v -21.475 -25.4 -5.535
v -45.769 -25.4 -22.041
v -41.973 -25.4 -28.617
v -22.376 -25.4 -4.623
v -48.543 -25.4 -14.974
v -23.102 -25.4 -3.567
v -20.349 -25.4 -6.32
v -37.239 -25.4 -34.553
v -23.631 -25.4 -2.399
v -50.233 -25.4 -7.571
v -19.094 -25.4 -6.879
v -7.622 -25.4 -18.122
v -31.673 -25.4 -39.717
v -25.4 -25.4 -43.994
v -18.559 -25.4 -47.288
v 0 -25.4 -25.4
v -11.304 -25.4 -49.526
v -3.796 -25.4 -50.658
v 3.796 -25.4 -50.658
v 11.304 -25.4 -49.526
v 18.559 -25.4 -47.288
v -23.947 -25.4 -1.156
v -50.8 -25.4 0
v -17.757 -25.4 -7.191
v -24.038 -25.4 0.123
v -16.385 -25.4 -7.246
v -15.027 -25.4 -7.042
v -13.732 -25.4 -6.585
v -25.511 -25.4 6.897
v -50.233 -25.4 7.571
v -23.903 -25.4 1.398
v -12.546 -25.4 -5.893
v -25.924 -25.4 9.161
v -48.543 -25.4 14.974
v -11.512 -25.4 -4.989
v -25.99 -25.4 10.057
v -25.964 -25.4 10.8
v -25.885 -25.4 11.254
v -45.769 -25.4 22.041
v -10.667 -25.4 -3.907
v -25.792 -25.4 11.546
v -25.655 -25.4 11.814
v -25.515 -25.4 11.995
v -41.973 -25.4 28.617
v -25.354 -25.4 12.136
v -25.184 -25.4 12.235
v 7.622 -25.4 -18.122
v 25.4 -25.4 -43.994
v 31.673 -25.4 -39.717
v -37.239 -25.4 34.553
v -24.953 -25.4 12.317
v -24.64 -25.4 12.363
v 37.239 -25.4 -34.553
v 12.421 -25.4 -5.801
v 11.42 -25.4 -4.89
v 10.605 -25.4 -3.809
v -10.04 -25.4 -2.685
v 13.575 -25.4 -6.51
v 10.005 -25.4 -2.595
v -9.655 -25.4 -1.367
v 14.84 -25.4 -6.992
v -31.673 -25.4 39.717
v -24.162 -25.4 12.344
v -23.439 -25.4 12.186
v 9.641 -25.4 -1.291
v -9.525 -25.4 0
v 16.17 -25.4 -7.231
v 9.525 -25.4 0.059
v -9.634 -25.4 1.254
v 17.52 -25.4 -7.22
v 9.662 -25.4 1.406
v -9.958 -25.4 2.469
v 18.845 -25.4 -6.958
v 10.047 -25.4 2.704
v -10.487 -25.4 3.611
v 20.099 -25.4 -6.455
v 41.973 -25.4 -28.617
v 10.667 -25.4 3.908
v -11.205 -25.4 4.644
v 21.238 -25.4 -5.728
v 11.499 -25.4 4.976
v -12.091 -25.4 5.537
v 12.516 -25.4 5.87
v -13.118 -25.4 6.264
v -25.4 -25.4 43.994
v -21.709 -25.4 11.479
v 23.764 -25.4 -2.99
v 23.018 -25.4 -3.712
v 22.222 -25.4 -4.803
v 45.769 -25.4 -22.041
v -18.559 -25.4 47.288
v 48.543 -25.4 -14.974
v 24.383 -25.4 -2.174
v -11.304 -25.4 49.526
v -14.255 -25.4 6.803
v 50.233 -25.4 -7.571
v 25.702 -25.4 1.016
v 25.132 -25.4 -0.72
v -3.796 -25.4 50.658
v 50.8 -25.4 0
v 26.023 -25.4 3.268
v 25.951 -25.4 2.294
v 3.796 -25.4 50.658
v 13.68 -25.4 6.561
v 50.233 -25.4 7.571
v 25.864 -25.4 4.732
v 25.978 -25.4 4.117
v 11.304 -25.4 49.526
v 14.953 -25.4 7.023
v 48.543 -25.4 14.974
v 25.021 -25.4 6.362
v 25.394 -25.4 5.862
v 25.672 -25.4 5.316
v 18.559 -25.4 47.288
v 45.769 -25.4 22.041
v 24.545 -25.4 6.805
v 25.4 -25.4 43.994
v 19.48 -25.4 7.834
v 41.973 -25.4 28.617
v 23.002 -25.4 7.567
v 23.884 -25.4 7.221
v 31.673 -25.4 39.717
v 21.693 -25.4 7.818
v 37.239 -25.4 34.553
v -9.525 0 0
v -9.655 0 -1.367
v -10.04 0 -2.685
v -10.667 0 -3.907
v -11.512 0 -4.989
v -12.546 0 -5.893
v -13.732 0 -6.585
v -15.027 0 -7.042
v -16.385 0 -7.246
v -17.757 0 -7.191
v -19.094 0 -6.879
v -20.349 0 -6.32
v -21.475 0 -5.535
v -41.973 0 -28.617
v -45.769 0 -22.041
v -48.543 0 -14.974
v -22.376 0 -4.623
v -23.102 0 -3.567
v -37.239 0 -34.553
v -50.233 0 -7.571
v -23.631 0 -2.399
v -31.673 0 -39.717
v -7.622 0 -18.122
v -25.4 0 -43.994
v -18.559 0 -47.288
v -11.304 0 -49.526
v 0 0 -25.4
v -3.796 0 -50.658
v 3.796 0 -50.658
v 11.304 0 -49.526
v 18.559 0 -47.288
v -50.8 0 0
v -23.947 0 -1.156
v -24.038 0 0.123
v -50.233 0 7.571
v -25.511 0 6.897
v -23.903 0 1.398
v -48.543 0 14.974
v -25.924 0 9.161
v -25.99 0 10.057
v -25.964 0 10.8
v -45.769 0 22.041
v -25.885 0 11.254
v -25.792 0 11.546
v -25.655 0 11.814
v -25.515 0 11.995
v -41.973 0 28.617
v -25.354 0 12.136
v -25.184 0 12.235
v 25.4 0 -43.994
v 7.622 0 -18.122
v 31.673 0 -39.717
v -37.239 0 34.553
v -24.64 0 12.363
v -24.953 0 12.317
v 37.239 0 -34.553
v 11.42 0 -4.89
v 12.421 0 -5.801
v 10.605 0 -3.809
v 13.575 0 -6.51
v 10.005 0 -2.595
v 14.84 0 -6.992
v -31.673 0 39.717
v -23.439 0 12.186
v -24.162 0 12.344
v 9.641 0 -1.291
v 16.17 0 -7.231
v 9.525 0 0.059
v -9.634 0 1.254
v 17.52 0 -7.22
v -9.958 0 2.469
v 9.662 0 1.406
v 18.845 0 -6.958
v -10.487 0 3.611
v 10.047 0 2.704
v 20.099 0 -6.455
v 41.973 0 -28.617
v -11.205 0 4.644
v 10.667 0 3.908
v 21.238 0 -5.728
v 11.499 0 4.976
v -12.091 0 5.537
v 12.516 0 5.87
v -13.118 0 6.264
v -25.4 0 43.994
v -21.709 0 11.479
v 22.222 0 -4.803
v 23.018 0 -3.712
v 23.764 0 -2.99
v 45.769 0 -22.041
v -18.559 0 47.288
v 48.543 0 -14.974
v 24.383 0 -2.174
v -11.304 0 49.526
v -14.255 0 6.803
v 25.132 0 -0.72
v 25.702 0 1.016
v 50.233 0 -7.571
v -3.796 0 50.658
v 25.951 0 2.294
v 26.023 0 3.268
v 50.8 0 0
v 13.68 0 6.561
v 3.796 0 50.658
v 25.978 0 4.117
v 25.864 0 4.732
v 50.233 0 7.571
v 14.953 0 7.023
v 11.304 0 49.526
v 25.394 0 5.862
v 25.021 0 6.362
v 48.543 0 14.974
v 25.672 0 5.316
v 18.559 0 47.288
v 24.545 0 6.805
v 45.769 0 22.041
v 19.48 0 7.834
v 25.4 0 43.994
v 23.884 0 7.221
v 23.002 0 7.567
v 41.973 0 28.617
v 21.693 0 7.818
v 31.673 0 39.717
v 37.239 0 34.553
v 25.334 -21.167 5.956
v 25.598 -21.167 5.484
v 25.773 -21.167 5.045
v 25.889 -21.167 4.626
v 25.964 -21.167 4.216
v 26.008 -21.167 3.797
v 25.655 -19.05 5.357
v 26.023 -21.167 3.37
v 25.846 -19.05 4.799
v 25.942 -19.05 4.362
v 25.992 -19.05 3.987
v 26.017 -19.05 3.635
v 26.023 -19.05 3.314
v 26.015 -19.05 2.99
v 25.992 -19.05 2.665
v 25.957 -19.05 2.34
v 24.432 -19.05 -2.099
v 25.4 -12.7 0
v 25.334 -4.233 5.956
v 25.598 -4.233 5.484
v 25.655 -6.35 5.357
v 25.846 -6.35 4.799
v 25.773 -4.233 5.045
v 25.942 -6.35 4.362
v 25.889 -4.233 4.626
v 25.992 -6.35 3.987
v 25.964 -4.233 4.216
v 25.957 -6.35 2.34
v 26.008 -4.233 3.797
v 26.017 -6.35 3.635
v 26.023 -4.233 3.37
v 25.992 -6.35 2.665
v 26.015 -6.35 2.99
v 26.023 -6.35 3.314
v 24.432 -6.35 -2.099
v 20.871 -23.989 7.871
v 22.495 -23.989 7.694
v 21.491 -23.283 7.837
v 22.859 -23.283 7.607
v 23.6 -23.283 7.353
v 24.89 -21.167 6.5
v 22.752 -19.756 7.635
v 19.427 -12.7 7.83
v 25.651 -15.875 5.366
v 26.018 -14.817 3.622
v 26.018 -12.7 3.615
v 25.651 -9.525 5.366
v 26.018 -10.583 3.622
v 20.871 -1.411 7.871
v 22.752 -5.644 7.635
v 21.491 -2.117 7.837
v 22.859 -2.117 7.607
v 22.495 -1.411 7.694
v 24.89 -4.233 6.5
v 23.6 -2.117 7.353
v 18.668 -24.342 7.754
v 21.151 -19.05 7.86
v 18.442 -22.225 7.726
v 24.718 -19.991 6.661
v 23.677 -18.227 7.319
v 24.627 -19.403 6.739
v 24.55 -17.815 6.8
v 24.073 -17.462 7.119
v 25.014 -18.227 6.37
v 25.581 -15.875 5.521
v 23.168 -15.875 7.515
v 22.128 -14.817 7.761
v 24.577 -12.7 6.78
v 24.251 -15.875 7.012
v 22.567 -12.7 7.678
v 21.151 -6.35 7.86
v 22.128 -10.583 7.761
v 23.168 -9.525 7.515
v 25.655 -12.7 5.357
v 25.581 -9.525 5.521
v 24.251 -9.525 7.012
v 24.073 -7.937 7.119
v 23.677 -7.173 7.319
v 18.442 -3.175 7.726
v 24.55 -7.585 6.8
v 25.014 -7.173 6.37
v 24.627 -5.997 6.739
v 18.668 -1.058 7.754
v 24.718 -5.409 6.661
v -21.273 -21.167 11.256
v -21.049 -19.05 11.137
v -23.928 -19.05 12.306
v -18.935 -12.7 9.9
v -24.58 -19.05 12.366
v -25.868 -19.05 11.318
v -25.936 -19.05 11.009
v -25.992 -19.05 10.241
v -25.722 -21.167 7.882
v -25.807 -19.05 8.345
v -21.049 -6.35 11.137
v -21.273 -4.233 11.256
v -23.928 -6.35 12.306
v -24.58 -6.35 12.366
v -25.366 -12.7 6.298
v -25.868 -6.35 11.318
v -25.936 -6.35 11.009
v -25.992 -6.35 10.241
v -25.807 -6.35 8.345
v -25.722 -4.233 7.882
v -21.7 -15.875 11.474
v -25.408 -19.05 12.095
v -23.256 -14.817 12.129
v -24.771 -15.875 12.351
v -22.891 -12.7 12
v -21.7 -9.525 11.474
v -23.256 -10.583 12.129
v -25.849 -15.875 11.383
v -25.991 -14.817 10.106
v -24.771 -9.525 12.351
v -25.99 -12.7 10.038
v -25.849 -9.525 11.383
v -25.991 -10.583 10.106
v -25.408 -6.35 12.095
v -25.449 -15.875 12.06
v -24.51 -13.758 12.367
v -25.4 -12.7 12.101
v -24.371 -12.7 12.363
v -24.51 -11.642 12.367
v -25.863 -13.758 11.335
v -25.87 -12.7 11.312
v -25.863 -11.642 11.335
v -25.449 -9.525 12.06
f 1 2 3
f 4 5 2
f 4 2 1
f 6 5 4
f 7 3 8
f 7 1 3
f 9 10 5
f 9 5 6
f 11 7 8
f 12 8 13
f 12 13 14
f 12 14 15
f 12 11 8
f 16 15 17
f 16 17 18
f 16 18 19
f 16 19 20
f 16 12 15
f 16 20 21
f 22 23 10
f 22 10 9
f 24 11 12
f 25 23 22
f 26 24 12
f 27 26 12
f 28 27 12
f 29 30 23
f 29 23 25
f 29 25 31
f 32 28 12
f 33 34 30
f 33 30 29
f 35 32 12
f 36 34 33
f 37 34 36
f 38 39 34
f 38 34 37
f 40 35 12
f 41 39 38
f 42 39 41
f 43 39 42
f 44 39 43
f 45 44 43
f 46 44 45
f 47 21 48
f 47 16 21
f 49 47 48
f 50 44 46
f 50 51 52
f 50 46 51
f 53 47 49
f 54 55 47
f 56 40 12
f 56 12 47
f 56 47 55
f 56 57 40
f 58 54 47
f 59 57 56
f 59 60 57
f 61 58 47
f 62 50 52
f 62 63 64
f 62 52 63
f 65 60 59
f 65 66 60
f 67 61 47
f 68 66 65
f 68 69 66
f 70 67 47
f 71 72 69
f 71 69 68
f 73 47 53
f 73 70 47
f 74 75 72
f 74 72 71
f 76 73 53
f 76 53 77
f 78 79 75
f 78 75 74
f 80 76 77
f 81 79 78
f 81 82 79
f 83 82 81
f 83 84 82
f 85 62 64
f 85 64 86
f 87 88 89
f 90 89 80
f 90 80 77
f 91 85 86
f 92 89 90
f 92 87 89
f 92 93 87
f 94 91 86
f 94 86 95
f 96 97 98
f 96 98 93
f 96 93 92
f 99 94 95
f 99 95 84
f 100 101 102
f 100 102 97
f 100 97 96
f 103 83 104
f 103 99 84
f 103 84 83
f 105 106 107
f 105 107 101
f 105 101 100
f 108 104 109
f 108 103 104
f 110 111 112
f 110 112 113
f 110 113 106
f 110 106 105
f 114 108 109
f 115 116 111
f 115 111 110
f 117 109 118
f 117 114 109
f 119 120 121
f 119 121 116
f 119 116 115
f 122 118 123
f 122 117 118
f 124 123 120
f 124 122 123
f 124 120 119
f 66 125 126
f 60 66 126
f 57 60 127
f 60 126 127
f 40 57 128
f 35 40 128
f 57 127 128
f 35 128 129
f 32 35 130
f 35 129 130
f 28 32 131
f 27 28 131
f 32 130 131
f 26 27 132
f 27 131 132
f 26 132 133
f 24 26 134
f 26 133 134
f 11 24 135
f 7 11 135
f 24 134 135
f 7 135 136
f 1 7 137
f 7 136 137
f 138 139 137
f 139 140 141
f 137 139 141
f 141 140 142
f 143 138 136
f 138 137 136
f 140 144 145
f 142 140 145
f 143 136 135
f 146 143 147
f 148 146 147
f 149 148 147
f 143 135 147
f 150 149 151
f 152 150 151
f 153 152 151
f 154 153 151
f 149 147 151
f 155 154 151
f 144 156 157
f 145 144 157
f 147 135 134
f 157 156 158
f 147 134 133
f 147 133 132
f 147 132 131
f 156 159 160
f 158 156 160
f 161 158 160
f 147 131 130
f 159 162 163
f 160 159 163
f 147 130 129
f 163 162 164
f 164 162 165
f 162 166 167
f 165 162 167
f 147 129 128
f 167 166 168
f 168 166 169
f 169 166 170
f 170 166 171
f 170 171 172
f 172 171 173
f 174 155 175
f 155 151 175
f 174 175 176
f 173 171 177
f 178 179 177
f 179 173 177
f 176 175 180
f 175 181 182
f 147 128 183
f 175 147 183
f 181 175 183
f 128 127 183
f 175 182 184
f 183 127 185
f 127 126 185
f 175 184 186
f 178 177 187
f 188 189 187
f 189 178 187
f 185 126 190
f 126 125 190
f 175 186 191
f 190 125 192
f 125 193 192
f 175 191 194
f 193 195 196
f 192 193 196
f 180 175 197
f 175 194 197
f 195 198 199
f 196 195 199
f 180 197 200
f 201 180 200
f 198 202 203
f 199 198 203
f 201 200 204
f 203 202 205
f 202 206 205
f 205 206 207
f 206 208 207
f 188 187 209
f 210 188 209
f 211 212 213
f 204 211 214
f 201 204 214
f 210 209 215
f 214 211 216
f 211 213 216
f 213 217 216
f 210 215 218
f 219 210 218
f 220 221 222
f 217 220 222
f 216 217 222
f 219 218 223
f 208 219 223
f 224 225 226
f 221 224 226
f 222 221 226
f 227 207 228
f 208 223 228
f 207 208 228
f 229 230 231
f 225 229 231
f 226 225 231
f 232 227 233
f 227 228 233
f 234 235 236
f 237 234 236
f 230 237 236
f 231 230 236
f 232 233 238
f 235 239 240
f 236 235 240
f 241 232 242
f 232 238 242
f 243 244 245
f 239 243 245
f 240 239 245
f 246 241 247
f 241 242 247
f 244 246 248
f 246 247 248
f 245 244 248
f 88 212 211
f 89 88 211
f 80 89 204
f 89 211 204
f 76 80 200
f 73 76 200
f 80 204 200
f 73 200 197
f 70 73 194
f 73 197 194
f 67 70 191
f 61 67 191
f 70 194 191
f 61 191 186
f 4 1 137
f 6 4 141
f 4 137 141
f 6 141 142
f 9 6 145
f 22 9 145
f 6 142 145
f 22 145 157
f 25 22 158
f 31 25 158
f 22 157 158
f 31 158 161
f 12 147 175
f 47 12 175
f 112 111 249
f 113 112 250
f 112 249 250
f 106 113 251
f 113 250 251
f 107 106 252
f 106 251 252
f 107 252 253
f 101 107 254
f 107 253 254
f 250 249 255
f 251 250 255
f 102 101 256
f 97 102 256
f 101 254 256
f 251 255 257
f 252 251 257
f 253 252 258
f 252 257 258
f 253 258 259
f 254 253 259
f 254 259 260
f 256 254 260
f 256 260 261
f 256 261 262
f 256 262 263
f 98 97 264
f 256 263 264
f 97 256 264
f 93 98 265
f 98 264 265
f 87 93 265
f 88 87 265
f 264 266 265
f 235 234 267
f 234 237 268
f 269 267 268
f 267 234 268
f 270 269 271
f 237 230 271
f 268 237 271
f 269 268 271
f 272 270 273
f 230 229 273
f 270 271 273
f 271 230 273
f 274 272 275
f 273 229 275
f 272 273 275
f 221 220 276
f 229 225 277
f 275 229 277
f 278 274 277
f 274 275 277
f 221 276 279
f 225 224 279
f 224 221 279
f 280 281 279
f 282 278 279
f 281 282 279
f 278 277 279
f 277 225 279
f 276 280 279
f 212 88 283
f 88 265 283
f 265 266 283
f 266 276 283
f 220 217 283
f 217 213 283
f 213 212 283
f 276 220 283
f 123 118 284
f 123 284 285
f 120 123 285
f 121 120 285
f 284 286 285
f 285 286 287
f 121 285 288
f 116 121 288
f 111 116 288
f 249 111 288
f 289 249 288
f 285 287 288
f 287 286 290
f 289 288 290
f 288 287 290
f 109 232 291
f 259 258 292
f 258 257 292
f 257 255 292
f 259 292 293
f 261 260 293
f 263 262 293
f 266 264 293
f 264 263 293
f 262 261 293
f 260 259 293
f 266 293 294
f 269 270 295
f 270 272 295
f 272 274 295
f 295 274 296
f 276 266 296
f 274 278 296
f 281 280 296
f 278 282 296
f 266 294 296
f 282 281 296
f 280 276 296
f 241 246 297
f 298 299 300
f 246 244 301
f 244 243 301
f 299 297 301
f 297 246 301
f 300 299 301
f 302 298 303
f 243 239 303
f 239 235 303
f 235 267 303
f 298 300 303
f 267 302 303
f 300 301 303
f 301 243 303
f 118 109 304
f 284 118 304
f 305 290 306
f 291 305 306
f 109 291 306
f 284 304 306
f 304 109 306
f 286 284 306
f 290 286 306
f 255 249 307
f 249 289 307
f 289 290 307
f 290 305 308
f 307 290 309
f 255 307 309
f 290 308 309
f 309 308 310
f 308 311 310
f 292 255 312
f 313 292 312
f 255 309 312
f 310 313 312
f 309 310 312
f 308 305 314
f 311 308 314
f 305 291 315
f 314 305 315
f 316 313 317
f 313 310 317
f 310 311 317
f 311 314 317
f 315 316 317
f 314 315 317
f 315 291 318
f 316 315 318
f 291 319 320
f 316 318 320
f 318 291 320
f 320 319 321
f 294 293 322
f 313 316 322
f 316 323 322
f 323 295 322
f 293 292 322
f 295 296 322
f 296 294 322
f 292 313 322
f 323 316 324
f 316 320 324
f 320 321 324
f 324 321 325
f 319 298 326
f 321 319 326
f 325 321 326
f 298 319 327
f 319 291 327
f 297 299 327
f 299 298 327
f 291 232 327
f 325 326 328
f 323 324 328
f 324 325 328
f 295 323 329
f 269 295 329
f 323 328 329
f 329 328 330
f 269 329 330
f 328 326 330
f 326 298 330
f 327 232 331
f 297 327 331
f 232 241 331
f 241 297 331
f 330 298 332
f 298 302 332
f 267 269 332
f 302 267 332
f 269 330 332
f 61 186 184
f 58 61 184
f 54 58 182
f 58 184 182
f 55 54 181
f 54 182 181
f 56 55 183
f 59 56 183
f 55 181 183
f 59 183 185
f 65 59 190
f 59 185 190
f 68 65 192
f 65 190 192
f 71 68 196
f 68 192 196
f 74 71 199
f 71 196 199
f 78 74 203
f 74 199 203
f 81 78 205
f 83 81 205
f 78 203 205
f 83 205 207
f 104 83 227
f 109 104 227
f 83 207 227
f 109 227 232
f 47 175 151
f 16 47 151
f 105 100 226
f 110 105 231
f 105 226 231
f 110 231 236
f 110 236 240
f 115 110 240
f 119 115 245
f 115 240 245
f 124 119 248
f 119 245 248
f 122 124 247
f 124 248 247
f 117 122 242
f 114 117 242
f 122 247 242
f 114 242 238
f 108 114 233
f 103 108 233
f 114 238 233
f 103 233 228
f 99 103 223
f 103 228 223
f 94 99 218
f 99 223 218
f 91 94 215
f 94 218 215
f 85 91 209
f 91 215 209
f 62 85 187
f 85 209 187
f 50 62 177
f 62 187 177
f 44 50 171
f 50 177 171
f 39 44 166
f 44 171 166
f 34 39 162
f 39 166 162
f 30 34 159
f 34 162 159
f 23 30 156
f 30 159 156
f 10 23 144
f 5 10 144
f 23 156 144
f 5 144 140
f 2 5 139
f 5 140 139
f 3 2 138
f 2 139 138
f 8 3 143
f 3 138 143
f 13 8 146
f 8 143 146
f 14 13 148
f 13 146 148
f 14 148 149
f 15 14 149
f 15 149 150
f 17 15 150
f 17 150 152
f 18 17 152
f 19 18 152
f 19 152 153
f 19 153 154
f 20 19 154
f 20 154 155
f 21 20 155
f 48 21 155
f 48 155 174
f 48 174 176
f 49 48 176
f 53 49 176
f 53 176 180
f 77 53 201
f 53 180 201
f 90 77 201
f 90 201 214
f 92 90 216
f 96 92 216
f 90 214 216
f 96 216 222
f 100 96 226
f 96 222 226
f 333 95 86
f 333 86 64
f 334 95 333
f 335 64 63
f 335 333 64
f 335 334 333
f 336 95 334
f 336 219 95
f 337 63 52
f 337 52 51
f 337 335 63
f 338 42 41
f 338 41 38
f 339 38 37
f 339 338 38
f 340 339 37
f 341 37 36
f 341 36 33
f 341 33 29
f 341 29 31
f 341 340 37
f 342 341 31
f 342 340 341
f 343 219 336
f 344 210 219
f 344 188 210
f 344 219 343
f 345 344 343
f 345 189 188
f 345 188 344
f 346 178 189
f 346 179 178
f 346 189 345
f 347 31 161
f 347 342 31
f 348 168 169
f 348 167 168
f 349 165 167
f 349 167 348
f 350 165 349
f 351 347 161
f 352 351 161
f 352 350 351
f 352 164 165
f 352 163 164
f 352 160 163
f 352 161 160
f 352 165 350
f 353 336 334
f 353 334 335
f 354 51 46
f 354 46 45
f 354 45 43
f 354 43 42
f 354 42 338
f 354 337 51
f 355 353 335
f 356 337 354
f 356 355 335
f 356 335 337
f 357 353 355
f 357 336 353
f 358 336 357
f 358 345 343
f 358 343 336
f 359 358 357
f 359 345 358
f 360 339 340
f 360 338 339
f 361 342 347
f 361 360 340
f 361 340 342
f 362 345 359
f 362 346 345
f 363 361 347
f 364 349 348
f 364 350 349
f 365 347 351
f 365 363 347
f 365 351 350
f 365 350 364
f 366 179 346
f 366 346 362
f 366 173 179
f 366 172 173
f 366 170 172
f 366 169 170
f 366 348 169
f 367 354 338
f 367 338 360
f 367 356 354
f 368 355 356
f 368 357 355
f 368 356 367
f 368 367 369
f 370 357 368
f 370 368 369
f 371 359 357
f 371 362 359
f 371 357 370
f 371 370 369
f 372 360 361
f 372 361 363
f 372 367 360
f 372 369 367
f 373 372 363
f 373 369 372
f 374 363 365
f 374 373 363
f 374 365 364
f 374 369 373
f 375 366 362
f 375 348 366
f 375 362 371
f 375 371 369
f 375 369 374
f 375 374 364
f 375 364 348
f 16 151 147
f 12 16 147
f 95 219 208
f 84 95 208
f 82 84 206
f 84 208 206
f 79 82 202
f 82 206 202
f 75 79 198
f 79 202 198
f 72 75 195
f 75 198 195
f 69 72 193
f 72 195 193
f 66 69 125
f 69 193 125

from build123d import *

# Parameters (mm, degrees)
F0_R     = 50.8
F1_DEPTH = 25.4


with BuildPart() as f1:
    # F0 (on Front) → F1 (new body)
    with BuildSketch(Plane.XZ):
        Circle(F0_R)
        Polygon((0, -25.4), (-7.6217073622, -18.1220550468), (7.6217073622, -18.1220550468), align=None, mode=Mode.SUBTRACT)
        with BuildLine():
            ThreePointArc((-14.2554945443, 6.803100084), (-10.8238557625, 4.1430589359), (-9.525, 0))
            ThreePointArc((-9.525, 0), (-13.7319278898, -6.5850065377), (-21.475243217, -5.5354251383))
            ThreePointArc((-21.475243217, -5.5354251383), (-23.6314387915, -2.3985970176), (-23.9033384682, 1.3981042586))
            add(Edge.make_bspline(
                [(-14.2554945443, 6.803100084), (-19.0561525649, 10.0658788244), (-27.9600989694, 16.1266078405), (-25.6616575186, 6.7049880874), (-23.9033384682, 1.3981042586)],
                knots=[0, 0, 0, 0, 0.4524785293, 0.8394989496, 0.8394989496, 0.8394989496, 0.8394989496], degree=3))
        make_face(mode=Mode.SUBTRACT)
        with BuildLine():
            ThreePointArc((14.839976255, -6.9924324336), (9.525236299, 0.0585632534), (14.9530797492, 7.0228662664))
            add(Edge.make_bspline(
                [(14.9530797492, 7.0228662664), (27.0596550391, 10.175950689), (26.5589054798, 1.2219851028), (24.153074938, -2.7644417195), (23.0182577745, -3.7117372195)],
                knots=[0, 0, 0, 0, 0.4992357934, 0.7063104799, 0.7063104799, 0.7063104799, 0.7063104799], degree=3))
            ThreePointArc((23.0182577745, -3.7117372195), (19.4840381744, -6.7354201163), (14.839976255, -6.9924324336))
        make_face(mode=Mode.SUBTRACT)
    extrude(amount=F1_DEPTH)


solid = f1.part
